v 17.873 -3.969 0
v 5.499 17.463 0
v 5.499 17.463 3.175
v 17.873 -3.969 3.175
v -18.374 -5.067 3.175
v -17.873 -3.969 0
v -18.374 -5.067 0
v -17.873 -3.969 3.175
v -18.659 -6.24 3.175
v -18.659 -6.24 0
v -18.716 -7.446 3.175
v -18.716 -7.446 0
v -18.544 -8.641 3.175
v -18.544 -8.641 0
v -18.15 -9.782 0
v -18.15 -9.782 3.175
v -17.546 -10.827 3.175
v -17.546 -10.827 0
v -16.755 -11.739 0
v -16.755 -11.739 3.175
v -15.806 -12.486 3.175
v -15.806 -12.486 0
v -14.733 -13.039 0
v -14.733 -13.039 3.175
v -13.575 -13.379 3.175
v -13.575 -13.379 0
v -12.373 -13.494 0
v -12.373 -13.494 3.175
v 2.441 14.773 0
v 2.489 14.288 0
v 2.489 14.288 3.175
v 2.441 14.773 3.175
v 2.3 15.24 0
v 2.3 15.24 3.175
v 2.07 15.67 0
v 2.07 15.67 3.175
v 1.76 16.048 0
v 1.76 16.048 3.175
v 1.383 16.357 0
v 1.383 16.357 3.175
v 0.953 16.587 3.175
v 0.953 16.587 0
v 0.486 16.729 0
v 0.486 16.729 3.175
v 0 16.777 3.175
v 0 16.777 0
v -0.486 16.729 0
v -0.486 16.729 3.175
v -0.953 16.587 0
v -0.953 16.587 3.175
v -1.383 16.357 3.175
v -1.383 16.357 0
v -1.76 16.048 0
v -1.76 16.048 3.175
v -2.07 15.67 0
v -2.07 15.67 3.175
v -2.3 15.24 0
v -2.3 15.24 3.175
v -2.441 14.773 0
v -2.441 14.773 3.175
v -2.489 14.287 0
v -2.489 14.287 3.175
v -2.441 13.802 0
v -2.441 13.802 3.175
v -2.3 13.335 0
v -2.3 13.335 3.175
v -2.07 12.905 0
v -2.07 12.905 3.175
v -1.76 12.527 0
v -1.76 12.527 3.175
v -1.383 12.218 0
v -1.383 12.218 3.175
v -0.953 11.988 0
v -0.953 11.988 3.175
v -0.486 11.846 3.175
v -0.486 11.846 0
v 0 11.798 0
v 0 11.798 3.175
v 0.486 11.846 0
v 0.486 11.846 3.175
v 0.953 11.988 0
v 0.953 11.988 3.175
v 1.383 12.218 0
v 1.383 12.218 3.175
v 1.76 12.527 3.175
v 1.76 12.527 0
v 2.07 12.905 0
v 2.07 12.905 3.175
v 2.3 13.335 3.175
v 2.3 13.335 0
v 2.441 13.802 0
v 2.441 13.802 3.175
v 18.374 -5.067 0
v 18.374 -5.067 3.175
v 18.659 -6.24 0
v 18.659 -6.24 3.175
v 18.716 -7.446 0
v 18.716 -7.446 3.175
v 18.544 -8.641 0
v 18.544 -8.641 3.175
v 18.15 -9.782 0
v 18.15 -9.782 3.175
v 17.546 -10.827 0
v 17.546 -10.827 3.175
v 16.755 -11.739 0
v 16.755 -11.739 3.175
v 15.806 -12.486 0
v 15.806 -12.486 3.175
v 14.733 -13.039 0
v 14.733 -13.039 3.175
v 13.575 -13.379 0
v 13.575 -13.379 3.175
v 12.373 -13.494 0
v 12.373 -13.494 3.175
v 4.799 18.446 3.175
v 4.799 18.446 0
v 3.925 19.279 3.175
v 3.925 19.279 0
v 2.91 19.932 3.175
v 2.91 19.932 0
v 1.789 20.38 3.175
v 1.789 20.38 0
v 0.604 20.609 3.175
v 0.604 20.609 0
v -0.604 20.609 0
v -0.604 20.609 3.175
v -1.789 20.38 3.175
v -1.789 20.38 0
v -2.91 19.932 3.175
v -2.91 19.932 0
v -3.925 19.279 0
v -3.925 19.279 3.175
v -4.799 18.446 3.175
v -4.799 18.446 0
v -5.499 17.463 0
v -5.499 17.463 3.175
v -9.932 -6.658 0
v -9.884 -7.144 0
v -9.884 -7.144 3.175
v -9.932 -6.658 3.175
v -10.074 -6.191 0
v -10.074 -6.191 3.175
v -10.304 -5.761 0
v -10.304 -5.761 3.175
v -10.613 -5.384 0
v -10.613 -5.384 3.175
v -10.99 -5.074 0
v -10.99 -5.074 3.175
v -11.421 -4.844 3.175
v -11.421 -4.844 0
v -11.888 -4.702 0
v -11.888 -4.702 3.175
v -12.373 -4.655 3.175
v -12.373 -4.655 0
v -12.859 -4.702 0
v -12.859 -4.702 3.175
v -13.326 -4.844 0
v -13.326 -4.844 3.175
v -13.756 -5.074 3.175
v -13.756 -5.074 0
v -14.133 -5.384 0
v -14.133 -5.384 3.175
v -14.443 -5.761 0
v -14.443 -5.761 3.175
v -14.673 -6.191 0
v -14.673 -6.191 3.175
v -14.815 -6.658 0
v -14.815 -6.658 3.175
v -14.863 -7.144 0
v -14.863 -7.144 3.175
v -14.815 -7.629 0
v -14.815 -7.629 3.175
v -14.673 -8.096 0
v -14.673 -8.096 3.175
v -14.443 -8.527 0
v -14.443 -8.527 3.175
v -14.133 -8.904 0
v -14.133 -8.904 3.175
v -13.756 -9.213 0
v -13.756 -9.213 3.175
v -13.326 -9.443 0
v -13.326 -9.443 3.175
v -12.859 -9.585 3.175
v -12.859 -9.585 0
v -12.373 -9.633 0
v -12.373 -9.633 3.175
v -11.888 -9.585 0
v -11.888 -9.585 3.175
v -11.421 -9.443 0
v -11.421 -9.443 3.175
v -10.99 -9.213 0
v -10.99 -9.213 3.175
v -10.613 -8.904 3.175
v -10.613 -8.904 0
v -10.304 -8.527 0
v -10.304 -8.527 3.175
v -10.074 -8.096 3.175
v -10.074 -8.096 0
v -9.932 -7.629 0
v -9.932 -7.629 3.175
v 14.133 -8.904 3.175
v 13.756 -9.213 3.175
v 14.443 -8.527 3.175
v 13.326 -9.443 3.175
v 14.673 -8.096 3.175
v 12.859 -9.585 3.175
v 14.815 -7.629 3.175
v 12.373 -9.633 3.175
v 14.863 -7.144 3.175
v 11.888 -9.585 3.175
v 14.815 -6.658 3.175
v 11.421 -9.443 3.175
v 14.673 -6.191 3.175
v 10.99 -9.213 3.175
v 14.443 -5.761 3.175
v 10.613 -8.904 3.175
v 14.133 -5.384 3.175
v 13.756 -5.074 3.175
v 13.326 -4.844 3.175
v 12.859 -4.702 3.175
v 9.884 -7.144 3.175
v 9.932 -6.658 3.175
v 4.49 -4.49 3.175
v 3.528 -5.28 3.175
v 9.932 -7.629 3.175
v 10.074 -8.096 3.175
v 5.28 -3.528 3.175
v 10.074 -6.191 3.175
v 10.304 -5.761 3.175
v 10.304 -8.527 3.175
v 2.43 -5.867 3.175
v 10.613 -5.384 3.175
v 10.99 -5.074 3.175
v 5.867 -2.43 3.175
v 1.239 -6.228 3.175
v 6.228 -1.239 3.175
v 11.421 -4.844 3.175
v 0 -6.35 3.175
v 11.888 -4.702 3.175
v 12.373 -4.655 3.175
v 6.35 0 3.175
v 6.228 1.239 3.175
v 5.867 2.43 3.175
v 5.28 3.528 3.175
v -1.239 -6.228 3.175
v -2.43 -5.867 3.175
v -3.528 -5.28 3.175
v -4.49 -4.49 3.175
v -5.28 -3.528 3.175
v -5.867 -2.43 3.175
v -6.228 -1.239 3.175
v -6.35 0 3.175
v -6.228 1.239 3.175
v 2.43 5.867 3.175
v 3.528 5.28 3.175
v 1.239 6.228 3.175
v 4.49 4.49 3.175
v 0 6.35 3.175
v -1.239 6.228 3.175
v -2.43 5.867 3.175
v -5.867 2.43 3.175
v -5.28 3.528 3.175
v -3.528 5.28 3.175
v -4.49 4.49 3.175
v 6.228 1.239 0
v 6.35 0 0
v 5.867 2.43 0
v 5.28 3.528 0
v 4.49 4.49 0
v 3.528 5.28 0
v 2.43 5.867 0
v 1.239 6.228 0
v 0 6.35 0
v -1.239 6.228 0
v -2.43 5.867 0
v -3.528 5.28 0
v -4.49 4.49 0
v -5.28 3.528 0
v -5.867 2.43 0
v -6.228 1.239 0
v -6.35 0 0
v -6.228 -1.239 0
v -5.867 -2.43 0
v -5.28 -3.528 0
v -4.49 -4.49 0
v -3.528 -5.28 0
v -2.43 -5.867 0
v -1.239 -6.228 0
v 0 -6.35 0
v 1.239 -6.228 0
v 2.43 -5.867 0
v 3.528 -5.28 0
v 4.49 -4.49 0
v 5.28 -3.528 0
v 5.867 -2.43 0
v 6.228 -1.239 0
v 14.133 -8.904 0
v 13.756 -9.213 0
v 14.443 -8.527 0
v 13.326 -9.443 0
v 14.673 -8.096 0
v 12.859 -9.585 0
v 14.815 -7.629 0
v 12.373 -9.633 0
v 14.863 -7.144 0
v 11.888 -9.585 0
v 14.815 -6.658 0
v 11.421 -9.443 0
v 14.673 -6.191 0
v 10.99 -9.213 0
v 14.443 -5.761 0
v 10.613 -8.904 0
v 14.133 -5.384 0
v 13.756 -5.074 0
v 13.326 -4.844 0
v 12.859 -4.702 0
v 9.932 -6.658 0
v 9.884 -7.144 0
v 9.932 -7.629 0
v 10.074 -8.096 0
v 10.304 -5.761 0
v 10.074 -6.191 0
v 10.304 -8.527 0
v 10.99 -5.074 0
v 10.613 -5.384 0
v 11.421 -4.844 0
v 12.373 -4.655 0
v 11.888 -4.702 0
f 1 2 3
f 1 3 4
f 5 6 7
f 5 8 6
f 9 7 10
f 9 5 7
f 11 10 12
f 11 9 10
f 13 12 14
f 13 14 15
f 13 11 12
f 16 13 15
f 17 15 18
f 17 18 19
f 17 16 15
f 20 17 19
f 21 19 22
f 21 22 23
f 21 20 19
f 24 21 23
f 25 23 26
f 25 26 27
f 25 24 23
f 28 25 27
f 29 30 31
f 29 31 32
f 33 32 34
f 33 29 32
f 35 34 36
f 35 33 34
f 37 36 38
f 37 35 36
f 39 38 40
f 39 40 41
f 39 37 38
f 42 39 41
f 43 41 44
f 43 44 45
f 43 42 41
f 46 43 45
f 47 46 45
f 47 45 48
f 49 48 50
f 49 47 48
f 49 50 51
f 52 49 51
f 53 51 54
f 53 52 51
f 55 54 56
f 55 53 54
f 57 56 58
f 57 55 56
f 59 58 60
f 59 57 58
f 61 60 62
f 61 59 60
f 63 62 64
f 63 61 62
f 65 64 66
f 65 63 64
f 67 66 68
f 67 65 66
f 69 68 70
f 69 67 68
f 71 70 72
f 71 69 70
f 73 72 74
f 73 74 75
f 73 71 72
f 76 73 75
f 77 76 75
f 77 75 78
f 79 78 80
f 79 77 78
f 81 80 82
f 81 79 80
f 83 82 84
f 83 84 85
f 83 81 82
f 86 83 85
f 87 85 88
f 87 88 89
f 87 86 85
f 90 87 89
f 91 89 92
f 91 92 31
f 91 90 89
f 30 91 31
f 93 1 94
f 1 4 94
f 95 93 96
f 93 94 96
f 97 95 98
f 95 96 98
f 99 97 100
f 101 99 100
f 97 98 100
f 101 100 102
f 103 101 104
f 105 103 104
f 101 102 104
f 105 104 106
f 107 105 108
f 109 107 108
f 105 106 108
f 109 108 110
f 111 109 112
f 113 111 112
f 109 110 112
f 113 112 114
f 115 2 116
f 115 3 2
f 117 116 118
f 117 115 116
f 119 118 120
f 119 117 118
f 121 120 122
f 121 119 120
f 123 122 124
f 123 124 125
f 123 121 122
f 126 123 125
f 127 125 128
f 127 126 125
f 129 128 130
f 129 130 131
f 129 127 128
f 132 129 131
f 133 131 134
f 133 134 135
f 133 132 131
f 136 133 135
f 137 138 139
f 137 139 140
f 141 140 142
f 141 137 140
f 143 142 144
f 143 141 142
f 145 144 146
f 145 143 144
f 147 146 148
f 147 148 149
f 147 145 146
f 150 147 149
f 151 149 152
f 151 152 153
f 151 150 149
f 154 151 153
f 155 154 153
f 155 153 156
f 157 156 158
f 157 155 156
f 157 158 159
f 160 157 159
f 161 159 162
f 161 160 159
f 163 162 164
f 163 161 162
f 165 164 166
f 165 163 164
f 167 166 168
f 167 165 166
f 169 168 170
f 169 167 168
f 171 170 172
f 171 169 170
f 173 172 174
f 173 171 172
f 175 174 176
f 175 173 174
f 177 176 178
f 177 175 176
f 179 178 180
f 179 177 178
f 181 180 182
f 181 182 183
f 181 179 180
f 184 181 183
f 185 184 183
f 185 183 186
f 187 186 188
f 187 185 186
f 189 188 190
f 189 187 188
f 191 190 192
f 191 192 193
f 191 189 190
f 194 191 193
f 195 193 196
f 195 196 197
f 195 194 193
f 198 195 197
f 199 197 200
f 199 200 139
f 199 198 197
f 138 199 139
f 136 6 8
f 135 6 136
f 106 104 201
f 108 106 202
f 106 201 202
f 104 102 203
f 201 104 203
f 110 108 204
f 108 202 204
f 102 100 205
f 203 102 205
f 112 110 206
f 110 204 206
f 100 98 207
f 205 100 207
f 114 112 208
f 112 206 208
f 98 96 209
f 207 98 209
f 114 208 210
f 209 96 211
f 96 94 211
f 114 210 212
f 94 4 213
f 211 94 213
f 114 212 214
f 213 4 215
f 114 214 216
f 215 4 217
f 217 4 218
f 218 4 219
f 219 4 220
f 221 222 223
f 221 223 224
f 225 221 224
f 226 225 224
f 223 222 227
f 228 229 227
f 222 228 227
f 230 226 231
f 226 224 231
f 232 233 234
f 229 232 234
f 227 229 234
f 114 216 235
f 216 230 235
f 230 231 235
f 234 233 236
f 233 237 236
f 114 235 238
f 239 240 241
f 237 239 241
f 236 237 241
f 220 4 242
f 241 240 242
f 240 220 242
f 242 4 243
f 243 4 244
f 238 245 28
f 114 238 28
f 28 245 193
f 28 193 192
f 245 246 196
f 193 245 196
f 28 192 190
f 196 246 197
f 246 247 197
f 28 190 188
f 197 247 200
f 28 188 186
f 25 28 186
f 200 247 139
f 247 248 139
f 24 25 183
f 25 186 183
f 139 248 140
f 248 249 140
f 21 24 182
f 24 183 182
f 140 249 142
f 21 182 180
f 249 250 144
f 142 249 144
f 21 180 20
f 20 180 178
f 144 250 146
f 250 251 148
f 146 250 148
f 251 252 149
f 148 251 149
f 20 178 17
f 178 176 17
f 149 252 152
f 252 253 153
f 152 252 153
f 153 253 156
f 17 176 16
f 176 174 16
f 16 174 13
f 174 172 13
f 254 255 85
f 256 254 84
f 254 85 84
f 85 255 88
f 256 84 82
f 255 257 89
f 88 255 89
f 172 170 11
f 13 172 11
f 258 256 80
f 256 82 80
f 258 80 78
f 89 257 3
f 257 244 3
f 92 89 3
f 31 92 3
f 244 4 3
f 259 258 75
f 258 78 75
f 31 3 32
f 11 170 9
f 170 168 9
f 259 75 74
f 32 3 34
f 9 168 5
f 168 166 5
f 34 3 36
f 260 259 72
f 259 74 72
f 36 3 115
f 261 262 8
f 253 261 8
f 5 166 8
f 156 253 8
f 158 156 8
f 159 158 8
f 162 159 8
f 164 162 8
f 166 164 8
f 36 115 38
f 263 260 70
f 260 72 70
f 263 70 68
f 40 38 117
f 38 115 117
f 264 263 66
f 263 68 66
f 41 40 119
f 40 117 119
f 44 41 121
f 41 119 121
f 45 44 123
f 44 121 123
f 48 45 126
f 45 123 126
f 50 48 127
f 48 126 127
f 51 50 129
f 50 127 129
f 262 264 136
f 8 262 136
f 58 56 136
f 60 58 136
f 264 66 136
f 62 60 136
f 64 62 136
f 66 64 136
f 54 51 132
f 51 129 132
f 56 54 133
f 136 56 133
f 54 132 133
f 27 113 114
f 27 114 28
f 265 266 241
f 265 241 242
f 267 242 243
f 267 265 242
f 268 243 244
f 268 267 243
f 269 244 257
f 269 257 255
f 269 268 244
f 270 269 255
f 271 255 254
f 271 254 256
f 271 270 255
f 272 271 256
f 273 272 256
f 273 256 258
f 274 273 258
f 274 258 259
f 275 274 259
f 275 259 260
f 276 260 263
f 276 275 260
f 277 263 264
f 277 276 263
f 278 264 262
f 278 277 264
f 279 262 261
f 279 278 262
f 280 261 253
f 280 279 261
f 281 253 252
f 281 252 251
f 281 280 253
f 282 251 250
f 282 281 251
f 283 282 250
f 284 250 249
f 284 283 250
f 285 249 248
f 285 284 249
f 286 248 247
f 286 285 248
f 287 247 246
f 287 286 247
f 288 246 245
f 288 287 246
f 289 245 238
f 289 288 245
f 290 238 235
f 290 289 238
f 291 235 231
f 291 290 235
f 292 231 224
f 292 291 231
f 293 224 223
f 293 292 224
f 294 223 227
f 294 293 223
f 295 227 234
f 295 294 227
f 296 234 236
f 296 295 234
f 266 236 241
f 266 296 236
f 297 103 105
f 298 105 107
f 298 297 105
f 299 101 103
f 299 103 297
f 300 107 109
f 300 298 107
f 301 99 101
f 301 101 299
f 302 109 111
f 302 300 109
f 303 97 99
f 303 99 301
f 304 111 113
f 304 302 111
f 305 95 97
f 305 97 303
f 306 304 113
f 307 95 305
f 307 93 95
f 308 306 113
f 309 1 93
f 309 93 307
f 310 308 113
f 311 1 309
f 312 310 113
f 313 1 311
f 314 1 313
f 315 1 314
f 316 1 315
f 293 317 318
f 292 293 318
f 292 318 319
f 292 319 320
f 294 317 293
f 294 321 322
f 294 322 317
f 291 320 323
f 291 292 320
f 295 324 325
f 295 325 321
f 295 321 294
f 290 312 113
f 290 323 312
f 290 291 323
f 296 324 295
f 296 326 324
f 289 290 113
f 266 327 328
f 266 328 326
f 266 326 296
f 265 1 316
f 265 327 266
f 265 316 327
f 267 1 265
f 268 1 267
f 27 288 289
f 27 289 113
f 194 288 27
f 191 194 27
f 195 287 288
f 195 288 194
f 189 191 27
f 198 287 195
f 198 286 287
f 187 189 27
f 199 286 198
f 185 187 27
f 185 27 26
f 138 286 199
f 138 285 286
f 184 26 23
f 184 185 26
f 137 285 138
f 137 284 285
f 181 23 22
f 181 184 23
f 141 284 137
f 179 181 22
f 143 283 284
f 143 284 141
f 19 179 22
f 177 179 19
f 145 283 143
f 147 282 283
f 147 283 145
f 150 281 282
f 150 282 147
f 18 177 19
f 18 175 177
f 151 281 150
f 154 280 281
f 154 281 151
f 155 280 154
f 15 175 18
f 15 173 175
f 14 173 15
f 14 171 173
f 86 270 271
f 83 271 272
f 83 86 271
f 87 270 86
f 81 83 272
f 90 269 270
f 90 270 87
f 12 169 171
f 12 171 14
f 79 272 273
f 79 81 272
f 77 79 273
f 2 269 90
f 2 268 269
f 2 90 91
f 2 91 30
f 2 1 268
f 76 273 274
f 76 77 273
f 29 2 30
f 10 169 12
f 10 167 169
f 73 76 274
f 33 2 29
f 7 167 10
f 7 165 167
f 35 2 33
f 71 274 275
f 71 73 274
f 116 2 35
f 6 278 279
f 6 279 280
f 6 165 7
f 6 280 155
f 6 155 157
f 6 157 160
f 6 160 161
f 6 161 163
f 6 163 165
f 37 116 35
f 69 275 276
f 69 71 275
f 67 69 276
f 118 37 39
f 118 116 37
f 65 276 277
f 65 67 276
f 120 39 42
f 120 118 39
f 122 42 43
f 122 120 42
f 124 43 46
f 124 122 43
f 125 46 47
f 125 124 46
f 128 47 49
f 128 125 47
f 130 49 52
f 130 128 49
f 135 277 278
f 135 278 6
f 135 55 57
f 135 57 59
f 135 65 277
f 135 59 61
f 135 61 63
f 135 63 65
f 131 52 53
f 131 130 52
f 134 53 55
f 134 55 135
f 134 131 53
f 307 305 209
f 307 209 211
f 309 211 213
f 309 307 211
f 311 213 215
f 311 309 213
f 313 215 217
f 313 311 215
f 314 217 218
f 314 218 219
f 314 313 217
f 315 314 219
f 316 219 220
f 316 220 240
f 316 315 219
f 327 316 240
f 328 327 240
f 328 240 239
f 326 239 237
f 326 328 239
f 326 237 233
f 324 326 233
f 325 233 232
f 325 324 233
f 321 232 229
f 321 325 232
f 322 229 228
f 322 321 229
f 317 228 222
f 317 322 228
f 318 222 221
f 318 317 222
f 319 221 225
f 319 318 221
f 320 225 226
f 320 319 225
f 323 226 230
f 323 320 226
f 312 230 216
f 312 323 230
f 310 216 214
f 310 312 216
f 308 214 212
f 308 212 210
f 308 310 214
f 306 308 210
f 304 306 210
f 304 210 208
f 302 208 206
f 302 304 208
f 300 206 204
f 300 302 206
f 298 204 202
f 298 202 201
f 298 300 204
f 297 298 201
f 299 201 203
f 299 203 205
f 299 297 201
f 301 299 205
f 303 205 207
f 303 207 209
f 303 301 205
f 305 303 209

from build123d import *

# Parameters (mm, degrees)
SKETCH1_R           = 6.35
SKETCH1_R_2         = 2.4892
BOSS_EXTRUDE1_DEPTH = 3.175
FILLET1_R           = 6.35


with BuildPart() as part:
    # Sketch1 → Boss-Extrude1 (new body)
    with BuildSketch(Plane.XY):
        Polygon((0, 26.9875), (23.371860585, -13.49375), (-23.371860585, -13.49375), align=None)
        Circle(SKETCH1_R, mode=Mode.SUBTRACT)
        with Locations((0, 14.2875)):
            Circle(SKETCH1_R_2, mode=Mode.SUBTRACT)
        with Locations((12.373337957, -7.14375)):
            Circle(SKETCH1_R_2, mode=Mode.SUBTRACT)
        with Locations((-12.373337957, -7.14375)):
            Circle(SKETCH1_R_2, mode=Mode.SUBTRACT)
    extrude(amount=BOSS_EXTRUDE1_DEPTH)

    # Fillet1
    fillet1_edges = [part.edges().sort_by_distance(p)[0] for p in [
        (0, 26.9875, 1.5875),
        (23.371860585, -13.49375, 1.5875),
        (-23.371860585, -13.49375, 1.5875),
    ]]
    fillet(fillet1_edges, radius=FILLET1_R)


solid = part.part
